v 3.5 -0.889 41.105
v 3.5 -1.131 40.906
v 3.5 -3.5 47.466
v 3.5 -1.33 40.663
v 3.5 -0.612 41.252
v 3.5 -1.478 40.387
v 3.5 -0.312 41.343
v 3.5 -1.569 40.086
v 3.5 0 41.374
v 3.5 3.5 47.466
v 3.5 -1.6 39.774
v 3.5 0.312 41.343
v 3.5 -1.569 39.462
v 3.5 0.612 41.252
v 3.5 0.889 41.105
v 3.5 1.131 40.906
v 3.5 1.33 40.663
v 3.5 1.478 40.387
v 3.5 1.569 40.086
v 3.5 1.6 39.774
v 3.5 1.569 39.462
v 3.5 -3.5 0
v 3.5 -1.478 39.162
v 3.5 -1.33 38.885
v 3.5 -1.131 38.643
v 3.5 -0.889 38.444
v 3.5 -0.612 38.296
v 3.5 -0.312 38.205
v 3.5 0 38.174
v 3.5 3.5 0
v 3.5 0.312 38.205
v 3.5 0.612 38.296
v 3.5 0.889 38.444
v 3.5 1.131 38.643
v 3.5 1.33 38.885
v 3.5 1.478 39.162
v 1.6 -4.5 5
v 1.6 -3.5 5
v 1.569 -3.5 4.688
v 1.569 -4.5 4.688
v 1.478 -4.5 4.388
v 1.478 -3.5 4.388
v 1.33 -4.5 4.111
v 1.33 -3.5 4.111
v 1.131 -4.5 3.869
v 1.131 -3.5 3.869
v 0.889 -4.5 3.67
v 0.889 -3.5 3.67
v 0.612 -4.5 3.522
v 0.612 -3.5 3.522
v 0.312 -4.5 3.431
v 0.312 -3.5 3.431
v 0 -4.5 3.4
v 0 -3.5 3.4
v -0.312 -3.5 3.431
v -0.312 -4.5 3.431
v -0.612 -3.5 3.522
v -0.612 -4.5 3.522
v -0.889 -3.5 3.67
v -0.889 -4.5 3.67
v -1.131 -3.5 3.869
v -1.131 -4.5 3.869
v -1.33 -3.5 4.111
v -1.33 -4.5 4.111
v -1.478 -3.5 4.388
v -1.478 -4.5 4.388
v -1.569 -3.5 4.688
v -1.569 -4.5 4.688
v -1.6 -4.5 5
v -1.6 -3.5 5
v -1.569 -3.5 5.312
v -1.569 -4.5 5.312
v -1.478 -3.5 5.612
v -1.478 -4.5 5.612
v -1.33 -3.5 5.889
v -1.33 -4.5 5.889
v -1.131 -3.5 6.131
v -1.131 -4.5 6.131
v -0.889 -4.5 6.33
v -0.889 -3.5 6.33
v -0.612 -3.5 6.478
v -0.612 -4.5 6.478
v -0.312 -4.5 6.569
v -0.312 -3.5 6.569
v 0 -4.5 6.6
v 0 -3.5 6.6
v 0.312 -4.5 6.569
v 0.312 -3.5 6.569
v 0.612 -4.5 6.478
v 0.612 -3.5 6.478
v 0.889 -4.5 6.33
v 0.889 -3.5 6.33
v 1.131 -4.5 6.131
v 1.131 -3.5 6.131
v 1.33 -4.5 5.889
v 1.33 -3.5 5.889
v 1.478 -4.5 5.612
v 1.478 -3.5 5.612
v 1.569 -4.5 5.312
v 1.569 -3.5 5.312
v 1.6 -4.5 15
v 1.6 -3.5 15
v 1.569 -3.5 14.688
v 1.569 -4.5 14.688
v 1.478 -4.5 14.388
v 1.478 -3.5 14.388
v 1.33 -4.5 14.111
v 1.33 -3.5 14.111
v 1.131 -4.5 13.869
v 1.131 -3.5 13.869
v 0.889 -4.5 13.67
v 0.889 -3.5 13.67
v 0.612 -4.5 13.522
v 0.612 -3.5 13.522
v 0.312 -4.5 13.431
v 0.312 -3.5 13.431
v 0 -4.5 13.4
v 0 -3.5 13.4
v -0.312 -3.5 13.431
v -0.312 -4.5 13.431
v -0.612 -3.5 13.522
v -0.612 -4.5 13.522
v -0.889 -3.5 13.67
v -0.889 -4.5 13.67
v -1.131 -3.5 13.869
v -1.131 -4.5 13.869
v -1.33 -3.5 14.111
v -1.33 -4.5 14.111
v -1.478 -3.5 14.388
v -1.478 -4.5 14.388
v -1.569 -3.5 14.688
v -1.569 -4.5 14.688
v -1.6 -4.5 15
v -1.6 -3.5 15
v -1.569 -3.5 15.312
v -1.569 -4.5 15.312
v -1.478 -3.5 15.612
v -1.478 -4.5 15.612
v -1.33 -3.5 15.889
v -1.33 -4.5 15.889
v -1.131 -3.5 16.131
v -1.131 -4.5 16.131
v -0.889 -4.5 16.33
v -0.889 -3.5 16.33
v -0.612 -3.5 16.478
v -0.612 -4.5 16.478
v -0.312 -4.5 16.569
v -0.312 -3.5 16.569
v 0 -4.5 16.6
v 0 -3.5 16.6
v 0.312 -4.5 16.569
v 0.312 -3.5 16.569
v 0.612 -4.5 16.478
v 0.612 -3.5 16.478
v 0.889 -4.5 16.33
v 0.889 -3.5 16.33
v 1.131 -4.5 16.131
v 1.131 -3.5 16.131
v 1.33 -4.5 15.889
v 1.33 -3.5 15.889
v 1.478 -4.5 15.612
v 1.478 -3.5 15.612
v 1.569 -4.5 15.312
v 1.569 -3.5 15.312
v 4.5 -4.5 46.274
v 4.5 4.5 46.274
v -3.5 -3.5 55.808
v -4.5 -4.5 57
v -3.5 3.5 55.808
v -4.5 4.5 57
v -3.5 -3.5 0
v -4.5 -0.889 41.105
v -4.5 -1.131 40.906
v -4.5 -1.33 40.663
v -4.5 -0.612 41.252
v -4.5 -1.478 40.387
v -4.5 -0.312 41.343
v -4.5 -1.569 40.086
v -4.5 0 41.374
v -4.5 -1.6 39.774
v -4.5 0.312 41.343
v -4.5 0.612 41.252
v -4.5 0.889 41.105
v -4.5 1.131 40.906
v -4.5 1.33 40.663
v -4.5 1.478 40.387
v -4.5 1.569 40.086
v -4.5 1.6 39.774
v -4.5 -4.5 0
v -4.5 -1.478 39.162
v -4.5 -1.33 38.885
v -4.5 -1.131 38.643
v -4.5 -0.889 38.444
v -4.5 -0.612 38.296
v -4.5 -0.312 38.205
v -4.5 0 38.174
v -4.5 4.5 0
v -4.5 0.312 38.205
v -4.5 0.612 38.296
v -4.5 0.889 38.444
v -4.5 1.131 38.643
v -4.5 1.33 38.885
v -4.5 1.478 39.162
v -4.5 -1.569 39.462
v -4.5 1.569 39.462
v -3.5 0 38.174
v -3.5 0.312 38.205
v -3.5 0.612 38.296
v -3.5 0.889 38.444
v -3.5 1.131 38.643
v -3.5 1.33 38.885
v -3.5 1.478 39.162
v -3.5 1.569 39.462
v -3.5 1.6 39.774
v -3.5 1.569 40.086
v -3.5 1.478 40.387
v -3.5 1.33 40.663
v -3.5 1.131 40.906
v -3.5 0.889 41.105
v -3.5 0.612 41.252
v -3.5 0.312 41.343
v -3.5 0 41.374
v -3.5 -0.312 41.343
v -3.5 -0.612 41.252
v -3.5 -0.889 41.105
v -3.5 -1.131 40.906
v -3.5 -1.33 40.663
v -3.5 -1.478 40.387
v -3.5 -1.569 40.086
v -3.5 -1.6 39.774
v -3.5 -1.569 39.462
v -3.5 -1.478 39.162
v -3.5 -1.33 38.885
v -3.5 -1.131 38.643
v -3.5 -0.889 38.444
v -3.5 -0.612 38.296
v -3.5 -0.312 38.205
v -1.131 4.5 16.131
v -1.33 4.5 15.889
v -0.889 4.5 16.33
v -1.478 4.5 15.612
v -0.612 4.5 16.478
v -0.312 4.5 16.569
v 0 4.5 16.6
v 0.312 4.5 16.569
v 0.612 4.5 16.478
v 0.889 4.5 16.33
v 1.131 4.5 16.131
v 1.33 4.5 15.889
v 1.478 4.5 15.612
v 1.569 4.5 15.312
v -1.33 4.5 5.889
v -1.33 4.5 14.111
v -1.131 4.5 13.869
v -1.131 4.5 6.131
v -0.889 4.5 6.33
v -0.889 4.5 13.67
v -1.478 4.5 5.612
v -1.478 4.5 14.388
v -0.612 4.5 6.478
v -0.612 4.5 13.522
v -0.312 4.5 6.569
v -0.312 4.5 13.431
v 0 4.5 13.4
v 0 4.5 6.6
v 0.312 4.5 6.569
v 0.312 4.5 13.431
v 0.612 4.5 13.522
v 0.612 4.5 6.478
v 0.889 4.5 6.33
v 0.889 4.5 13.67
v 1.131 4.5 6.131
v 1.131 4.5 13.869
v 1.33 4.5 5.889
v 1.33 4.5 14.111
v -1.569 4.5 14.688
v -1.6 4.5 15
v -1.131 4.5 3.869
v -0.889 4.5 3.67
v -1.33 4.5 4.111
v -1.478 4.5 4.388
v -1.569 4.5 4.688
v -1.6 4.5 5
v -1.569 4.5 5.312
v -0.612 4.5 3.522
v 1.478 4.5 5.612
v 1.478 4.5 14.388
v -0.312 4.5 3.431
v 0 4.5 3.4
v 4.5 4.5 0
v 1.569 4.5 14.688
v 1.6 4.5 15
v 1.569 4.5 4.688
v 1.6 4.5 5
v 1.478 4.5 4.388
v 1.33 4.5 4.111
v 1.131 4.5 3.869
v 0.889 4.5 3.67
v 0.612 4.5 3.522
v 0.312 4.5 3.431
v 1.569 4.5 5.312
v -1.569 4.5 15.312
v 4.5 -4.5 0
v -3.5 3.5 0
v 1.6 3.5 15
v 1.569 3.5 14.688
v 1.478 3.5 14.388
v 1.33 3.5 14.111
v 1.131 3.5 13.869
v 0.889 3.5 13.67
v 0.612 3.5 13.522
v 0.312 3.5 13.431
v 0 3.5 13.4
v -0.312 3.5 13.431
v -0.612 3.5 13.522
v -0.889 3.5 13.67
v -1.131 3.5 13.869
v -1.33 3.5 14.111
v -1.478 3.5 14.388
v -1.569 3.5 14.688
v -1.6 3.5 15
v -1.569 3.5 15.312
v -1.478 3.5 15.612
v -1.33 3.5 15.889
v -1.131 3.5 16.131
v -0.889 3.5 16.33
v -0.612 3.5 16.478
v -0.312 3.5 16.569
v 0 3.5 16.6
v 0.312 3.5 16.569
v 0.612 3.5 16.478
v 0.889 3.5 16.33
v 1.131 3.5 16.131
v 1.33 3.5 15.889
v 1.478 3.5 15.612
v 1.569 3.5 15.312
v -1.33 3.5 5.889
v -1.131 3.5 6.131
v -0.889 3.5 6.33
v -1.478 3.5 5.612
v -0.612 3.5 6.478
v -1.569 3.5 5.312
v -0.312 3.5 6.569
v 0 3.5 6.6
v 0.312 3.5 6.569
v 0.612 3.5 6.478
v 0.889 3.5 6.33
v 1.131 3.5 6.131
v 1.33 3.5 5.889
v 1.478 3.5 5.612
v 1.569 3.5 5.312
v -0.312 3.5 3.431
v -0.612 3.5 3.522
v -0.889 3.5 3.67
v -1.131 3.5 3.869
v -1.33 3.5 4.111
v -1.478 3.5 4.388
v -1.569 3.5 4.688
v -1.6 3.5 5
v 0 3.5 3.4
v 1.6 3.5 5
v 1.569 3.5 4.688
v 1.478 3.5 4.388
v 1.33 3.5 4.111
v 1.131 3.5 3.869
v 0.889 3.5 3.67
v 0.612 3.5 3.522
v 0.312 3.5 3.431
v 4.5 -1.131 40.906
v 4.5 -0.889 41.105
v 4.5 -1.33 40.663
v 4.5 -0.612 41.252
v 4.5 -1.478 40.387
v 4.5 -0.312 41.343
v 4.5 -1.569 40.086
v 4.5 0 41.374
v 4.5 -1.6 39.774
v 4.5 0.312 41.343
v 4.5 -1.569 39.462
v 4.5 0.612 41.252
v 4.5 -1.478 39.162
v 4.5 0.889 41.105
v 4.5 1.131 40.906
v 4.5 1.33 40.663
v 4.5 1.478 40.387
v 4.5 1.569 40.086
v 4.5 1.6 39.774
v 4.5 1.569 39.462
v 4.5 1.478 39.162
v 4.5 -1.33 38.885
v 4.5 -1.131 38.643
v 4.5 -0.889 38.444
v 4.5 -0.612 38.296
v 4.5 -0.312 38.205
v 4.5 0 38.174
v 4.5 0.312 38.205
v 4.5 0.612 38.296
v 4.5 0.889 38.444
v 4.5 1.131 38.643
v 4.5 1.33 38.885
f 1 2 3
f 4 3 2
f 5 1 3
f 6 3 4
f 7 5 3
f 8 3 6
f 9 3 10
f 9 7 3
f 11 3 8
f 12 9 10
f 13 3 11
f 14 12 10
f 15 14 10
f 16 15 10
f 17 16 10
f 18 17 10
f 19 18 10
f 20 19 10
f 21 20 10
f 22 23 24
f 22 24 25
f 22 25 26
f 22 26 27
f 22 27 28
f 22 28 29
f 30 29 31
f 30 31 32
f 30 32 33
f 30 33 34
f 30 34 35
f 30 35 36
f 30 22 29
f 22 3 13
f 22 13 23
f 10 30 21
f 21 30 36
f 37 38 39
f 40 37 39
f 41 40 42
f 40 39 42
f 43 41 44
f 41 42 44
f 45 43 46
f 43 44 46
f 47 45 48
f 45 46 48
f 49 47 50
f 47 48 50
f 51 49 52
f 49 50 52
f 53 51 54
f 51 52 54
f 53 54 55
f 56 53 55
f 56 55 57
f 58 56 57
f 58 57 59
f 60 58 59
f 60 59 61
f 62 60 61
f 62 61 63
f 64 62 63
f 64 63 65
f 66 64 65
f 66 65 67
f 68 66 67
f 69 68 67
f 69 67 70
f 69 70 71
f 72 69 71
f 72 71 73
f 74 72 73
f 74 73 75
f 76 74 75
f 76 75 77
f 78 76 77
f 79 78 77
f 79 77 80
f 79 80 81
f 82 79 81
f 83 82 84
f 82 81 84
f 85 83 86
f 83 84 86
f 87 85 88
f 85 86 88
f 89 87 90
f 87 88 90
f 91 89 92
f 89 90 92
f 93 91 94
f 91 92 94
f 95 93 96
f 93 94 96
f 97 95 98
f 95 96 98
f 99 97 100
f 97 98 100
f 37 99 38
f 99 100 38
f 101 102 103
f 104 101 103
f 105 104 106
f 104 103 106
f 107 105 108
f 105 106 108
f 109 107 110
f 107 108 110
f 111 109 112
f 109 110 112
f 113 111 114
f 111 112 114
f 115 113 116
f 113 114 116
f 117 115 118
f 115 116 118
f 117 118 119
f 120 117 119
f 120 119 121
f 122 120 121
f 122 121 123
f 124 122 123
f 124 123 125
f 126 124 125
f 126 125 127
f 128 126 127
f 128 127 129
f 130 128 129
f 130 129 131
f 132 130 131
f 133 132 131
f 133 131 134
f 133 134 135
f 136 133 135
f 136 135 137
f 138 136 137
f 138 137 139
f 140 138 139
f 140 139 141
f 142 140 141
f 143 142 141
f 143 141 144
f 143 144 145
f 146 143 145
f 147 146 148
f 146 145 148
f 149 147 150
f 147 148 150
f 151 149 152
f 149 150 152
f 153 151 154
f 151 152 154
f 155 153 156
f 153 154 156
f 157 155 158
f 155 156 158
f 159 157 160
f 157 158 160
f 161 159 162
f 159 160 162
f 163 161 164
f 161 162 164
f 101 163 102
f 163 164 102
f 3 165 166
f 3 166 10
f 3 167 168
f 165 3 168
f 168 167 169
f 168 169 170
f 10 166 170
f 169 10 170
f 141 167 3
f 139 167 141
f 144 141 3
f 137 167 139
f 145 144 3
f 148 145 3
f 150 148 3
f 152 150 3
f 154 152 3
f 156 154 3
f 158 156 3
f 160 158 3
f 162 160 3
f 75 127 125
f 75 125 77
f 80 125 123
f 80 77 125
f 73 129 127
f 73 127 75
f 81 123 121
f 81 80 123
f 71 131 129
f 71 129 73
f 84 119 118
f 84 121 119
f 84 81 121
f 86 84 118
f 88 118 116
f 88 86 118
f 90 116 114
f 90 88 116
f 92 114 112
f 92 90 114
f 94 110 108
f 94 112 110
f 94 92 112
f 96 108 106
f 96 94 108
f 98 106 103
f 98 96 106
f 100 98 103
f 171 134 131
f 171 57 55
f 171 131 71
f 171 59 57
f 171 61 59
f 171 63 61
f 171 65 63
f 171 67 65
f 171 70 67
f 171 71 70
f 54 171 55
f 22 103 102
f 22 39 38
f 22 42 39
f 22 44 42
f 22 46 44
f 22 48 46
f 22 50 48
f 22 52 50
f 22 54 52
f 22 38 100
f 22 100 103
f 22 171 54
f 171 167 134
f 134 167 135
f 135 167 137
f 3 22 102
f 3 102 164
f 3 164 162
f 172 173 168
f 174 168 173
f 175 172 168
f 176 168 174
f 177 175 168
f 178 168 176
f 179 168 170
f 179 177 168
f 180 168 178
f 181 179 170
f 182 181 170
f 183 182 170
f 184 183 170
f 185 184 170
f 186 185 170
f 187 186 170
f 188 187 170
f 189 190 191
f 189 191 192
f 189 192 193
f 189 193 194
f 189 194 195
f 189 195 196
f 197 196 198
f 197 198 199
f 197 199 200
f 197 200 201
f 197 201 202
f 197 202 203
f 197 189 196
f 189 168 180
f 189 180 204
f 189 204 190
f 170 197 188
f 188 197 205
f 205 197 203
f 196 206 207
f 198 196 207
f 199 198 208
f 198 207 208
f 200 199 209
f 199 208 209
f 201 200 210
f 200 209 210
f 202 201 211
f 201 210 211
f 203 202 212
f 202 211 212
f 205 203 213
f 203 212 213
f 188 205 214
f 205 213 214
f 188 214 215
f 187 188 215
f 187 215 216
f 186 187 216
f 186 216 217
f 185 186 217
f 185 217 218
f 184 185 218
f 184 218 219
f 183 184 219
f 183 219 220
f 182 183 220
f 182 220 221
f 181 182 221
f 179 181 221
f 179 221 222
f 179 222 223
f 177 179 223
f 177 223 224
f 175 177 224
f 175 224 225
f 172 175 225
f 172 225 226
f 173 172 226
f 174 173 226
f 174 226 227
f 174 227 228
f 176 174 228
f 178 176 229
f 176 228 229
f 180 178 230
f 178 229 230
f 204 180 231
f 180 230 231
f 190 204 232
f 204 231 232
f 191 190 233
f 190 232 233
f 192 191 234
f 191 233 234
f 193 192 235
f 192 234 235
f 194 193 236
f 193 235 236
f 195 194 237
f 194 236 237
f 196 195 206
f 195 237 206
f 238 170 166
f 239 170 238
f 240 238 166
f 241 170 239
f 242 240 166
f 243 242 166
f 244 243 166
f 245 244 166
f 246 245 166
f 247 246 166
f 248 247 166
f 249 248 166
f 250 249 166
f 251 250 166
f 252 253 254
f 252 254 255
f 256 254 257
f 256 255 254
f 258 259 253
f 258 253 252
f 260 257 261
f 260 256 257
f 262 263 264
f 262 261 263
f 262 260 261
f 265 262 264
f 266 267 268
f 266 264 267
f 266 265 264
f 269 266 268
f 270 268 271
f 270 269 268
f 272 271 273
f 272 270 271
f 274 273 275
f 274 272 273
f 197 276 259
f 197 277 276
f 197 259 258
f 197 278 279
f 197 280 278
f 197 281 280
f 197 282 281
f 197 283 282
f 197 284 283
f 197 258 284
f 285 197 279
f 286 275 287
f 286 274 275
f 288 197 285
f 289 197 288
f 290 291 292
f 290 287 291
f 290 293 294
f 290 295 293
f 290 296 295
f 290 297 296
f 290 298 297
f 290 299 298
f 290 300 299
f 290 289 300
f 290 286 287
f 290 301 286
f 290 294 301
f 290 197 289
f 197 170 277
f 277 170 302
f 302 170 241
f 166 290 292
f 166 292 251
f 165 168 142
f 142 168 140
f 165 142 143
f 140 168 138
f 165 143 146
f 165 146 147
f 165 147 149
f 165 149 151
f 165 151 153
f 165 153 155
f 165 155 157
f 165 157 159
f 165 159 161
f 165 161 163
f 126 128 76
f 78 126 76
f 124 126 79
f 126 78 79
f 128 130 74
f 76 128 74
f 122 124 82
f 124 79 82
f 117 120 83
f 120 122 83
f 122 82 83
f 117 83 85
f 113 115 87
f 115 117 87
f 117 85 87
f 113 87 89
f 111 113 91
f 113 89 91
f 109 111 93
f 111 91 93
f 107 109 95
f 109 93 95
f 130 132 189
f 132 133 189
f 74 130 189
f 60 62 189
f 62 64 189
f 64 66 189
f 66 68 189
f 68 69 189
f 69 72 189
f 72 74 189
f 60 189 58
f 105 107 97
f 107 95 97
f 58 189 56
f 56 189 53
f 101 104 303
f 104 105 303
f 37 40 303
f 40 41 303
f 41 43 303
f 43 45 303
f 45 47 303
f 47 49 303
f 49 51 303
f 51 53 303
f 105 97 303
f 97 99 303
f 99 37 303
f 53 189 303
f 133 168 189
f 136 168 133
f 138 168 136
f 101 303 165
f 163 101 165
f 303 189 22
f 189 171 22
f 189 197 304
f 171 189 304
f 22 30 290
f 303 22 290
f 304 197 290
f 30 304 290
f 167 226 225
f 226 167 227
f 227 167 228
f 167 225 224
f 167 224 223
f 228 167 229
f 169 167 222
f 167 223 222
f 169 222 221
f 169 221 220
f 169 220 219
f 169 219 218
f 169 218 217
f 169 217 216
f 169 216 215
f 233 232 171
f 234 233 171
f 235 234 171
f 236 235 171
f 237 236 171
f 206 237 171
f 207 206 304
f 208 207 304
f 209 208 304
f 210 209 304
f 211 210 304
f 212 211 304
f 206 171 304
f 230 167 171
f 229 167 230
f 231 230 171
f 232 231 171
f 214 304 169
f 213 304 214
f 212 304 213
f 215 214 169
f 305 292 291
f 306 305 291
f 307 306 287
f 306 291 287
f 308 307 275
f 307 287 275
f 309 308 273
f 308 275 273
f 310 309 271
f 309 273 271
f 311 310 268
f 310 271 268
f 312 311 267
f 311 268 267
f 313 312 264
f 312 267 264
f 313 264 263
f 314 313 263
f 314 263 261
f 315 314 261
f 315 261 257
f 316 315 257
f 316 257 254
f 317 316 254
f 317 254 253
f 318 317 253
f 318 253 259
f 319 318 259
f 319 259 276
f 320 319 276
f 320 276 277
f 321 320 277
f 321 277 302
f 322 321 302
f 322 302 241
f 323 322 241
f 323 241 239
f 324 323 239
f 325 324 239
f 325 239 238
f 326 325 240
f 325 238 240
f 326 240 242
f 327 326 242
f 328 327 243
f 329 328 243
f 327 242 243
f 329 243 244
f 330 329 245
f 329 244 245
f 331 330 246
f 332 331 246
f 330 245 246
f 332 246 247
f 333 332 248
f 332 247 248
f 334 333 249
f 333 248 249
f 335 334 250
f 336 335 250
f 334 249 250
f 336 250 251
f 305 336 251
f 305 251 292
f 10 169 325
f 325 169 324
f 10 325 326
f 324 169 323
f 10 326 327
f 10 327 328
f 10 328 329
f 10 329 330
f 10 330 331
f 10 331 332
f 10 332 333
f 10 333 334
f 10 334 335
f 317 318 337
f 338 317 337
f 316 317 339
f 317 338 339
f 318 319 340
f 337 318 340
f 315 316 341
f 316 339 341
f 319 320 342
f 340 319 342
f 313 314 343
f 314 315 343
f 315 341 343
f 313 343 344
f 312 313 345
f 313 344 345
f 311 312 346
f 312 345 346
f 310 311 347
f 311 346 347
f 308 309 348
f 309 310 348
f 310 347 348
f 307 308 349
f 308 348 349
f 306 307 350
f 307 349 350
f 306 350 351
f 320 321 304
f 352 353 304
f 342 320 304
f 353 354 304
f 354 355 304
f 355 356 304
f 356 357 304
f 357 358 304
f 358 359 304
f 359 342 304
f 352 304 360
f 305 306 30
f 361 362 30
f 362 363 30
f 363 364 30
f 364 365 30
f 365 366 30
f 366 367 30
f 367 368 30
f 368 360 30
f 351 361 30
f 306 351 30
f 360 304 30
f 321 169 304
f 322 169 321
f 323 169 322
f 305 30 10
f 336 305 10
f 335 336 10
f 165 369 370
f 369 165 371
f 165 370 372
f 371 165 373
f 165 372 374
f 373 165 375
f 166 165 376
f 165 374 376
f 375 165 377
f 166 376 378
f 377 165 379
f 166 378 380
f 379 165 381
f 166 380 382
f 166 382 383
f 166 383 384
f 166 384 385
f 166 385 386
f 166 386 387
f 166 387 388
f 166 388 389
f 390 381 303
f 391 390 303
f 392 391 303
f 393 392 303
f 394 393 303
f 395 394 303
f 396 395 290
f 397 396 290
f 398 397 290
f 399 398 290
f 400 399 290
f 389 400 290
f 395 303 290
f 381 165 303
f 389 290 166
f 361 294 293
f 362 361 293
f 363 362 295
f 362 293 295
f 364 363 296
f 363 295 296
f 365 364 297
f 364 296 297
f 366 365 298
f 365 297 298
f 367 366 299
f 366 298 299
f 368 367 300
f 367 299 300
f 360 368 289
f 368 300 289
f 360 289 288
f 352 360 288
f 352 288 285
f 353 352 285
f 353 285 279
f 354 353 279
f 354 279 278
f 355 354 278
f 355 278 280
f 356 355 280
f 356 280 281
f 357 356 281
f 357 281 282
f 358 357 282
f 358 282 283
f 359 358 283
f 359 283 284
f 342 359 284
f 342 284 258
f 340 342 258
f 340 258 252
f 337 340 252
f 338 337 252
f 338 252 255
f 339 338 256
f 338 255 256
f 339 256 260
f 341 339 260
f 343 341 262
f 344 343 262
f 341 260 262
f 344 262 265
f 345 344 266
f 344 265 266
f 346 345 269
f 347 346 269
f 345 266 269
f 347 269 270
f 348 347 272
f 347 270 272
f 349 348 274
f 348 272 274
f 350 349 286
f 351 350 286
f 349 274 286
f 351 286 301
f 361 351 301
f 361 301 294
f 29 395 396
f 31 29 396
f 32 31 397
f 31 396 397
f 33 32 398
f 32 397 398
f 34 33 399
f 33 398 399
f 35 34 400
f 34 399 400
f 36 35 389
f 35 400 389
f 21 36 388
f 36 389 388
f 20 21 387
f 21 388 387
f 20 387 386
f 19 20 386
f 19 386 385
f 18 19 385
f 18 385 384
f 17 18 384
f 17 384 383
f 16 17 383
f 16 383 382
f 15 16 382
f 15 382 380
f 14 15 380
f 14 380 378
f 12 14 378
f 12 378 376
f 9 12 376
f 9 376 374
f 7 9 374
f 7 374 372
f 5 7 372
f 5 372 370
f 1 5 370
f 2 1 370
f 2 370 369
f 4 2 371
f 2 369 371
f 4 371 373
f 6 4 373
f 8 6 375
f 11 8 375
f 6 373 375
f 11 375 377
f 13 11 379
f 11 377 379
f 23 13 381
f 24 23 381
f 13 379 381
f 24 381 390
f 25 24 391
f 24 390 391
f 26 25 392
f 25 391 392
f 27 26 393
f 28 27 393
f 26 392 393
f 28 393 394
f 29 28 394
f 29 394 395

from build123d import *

# Parameters (mm, degrees)
SKETCH_1_W          = 9
SKETCH_1_H          = 9
SKETCH_1_W_2        = 7
SKETCH_1_H_2        = 7
EXTRUDE_1_DEPTH     = 70
SKETCH_2_R          = 1.6
CUT_EXTRUDE_1_DEPTH = 50
CUT_EXTRUDE_2_DEPTH = 10
SKETCH_4_W          = 9
SKETCH_4_H          = 13
CUT_EXTRUDE_3_DEPTH = 10
SKETCH_5_R          = 1.6
CUT_EXTRUDE_4_DEPTH = 400


with BuildPart() as part:
    # ｽｹｯﾁ1 → ﾎﾞｽ - 押し出し1 (new body)
    with BuildSketch(Plane.XY):
        Rectangle(SKETCH_1_W, SKETCH_1_H)
        Rectangle(SKETCH_1_W_2, SKETCH_1_H_2, mode=Mode.SUBTRACT)
    extrude(amount=EXTRUDE_1_DEPTH)

    # ｽｹｯﾁ2 → ｶｯﾄ - 押し出し1 (cut)
    with BuildSketch(Plane(origin=(0, 4.5, 0), x_dir=(1, 0, 0), z_dir=(0, 1, 0))):
        with Locations((0, -5)):
            Circle(SKETCH_2_R)
        with Locations((0, -15)):
            Circle(SKETCH_2_R)
    extrude(amount=-CUT_EXTRUDE_1_DEPTH, mode=Mode.SUBTRACT)

    # ｽｹｯﾁ3 → ｶｯﾄ - 押し出し2 (cut)
    with BuildSketch(Plane(origin=(0, 4.5, 0), x_dir=(1, 0, 0), z_dir=(0, 1, 0))):
        Polygon((4.5, -46.274217667), (-4.5, -57), (4.5, -57), align=None)
    extrude(amount=-CUT_EXTRUDE_2_DEPTH, mode=Mode.SUBTRACT)

    # ｽｹｯﾁ4 → ｶｯﾄ - 押し出し3 (cut)
    with BuildSketch(Plane(origin=(0, 4.5, 0), x_dir=(1, 0, 0), z_dir=(0, 1, 0))):
        with Locations((0, -63.5)):
            Rectangle(SKETCH_4_W, SKETCH_4_H)
    extrude(amount=-CUT_EXTRUDE_3_DEPTH, mode=Mode.SUBTRACT)

    # ｽｹｯﾁ5 → ｶｯﾄ - 押し出し4 (cut)
    with BuildSketch(Plane(origin=(4.5, 0, 0), x_dir=(0, 0, -1), z_dir=(1, 0, 0))):
        with Locations((-39.774217667, 0)):
            Circle(SKETCH_5_R)
    extrude(amount=-CUT_EXTRUDE_4_DEPTH, mode=Mode.SUBTRACT)


solid = part.part
